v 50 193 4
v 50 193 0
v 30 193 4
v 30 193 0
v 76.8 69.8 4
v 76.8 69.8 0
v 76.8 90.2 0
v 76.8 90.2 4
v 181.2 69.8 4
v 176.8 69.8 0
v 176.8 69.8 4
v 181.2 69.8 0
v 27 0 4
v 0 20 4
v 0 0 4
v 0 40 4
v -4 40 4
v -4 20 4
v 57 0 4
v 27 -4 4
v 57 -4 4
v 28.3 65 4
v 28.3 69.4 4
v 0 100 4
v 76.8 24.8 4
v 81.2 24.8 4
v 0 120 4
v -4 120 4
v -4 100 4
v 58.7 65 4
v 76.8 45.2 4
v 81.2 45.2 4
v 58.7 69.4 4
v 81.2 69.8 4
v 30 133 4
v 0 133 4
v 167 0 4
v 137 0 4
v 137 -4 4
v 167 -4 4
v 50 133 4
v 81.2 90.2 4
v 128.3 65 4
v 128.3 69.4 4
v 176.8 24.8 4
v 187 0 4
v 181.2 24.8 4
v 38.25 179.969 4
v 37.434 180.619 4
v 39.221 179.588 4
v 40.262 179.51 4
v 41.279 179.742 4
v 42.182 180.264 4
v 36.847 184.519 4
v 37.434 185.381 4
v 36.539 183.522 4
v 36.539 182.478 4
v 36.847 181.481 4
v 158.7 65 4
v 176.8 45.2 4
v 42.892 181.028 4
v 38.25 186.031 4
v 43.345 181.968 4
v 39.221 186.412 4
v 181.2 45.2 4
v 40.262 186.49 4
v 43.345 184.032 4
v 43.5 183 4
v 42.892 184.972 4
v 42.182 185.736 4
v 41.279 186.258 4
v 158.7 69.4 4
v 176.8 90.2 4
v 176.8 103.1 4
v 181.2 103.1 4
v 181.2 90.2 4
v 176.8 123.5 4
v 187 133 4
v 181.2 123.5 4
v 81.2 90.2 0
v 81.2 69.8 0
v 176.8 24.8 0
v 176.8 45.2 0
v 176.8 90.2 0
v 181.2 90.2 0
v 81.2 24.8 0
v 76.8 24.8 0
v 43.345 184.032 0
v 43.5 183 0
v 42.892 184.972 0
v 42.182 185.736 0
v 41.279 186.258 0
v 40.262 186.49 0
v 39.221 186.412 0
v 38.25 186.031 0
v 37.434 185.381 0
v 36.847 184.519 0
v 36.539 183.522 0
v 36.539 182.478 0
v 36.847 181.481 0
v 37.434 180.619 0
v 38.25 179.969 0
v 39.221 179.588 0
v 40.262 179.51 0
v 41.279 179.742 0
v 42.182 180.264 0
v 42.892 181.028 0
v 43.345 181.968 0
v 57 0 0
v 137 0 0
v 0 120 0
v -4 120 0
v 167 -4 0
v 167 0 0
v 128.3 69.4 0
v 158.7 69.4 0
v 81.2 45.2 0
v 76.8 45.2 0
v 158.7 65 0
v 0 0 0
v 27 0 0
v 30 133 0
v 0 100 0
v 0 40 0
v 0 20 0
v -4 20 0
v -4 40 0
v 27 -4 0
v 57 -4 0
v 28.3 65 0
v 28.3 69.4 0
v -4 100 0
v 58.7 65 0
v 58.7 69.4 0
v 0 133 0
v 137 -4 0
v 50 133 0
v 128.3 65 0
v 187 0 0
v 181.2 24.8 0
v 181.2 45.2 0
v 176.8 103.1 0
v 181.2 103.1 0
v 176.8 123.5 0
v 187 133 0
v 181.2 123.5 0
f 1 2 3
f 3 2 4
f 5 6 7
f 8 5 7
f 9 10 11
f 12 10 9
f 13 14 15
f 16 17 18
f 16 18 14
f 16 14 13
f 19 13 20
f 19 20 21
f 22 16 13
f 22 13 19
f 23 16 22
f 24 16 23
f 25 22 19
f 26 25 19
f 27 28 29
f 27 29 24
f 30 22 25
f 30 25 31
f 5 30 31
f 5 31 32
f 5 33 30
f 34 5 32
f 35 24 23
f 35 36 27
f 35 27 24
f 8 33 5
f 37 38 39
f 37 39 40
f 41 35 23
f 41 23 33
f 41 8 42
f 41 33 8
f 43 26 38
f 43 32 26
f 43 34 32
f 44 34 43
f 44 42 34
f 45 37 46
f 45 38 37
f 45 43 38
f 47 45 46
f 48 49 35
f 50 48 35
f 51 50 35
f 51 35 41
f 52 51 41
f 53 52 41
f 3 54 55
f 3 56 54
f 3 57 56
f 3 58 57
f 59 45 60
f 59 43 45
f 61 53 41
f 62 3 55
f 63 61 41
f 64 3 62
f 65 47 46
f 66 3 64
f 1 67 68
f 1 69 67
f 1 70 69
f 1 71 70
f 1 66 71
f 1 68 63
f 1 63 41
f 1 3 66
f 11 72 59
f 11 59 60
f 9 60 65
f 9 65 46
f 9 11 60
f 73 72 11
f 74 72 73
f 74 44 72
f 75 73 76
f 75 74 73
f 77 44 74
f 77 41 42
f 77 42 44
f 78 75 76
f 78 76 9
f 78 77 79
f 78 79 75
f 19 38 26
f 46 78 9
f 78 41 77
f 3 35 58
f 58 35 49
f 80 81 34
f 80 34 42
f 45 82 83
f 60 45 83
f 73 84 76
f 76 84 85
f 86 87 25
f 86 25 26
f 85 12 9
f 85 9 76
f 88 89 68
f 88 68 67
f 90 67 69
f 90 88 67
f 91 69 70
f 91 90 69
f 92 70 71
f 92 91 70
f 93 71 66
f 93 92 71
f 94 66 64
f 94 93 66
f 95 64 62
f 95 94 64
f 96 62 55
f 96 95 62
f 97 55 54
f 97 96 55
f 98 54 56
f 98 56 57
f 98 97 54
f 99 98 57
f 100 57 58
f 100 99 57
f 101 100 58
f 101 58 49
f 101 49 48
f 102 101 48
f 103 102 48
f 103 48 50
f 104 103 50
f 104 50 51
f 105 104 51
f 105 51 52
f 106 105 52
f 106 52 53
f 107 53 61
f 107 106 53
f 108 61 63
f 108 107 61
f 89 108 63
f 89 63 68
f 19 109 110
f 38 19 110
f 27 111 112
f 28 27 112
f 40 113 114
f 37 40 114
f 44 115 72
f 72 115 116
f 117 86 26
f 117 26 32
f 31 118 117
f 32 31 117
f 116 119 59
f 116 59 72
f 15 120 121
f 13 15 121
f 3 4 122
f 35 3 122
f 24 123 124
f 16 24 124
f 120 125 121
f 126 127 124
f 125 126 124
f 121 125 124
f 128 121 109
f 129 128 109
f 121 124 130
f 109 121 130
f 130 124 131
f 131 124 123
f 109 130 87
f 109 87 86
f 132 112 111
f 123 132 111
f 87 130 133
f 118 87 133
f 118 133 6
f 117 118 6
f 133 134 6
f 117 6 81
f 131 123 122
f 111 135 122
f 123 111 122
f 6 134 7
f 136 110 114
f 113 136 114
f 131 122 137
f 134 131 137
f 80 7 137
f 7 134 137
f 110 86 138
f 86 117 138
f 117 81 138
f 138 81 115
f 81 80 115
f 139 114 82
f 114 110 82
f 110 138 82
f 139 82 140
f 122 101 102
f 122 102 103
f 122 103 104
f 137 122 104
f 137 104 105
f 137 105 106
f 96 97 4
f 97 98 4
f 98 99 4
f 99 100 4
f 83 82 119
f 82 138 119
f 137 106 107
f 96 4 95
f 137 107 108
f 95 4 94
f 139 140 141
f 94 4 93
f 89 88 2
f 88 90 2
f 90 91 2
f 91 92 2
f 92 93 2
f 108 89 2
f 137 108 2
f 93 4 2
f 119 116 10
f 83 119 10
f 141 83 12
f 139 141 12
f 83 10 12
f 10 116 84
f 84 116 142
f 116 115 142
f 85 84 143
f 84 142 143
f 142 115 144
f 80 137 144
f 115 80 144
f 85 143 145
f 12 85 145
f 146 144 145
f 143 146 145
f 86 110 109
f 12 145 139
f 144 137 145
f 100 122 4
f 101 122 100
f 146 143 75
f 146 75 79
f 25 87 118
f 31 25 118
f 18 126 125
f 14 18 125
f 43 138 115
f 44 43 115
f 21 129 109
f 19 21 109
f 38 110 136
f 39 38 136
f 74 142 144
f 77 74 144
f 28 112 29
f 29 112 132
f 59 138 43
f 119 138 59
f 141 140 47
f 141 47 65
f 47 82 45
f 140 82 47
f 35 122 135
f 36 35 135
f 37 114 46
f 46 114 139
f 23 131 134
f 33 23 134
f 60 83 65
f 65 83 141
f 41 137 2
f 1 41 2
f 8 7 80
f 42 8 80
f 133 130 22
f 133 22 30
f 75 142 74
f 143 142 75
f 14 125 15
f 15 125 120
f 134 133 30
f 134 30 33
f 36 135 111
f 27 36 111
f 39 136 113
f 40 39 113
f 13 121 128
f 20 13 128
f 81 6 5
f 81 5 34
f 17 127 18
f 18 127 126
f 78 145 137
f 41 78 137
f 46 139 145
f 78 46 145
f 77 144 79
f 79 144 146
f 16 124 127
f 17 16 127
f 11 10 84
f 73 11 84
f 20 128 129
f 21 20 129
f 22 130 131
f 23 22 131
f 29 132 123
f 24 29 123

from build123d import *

# Parameters (mm, degrees)
SKETCH_1_W      = 4.4
SKETCH_1_H      = 20.4
SKETCH_1_W_2    = 30.4
SKETCH_1_H_2    = 4.4
SKETCH_1_R      = 3.5
EXTRUDE_1_DEPTH = 4


with BuildPart() as part:
    # Эскиз1 → Бобышка-Вытянуть1 (new body)
    with BuildSketch(Plane.XY):
        Polygon((0, 20), (0, 0), (27, 0), (27, -4), (57, -4), (57, 0), (137, 0), (137, -4), (167, -4), (167, 0), (187, 0), (187, 133), (50, 133), (50, 193), (30, 193), (30, 133), (0, 133), (0, 120), (-4, 120), (-4, 100), (0, 100), (0, 40), (-4, 40), (-4, 20), align=None)
        with Locations((79, 35)):
            Rectangle(SKETCH_1_W, SKETCH_1_H, mode=Mode.SUBTRACT)
        with Locations((43.5, 67.2)):
            Rectangle(SKETCH_1_W_2, SKETCH_1_H_2, mode=Mode.SUBTRACT)
        with Locations((79, 80)):
            Rectangle(SKETCH_1_W, SKETCH_1_H, mode=Mode.SUBTRACT)
        with Locations((179, 35)):
            Rectangle(SKETCH_1_W, SKETCH_1_H, mode=Mode.SUBTRACT)
        with Locations((143.5, 67.2)):
            Rectangle(SKETCH_1_W_2, SKETCH_1_H_2, mode=Mode.SUBTRACT)
        with Locations((179, 80)):
            Rectangle(SKETCH_1_W, SKETCH_1_H, mode=Mode.SUBTRACT)
        with Locations((179, 113.3)):
            Rectangle(SKETCH_1_W, SKETCH_1_H, mode=Mode.SUBTRACT)
        with Locations((40, 183)):
            Circle(SKETCH_1_R, mode=Mode.SUBTRACT)
    extrude(amount=EXTRUDE_1_DEPTH)


solid = part.part
